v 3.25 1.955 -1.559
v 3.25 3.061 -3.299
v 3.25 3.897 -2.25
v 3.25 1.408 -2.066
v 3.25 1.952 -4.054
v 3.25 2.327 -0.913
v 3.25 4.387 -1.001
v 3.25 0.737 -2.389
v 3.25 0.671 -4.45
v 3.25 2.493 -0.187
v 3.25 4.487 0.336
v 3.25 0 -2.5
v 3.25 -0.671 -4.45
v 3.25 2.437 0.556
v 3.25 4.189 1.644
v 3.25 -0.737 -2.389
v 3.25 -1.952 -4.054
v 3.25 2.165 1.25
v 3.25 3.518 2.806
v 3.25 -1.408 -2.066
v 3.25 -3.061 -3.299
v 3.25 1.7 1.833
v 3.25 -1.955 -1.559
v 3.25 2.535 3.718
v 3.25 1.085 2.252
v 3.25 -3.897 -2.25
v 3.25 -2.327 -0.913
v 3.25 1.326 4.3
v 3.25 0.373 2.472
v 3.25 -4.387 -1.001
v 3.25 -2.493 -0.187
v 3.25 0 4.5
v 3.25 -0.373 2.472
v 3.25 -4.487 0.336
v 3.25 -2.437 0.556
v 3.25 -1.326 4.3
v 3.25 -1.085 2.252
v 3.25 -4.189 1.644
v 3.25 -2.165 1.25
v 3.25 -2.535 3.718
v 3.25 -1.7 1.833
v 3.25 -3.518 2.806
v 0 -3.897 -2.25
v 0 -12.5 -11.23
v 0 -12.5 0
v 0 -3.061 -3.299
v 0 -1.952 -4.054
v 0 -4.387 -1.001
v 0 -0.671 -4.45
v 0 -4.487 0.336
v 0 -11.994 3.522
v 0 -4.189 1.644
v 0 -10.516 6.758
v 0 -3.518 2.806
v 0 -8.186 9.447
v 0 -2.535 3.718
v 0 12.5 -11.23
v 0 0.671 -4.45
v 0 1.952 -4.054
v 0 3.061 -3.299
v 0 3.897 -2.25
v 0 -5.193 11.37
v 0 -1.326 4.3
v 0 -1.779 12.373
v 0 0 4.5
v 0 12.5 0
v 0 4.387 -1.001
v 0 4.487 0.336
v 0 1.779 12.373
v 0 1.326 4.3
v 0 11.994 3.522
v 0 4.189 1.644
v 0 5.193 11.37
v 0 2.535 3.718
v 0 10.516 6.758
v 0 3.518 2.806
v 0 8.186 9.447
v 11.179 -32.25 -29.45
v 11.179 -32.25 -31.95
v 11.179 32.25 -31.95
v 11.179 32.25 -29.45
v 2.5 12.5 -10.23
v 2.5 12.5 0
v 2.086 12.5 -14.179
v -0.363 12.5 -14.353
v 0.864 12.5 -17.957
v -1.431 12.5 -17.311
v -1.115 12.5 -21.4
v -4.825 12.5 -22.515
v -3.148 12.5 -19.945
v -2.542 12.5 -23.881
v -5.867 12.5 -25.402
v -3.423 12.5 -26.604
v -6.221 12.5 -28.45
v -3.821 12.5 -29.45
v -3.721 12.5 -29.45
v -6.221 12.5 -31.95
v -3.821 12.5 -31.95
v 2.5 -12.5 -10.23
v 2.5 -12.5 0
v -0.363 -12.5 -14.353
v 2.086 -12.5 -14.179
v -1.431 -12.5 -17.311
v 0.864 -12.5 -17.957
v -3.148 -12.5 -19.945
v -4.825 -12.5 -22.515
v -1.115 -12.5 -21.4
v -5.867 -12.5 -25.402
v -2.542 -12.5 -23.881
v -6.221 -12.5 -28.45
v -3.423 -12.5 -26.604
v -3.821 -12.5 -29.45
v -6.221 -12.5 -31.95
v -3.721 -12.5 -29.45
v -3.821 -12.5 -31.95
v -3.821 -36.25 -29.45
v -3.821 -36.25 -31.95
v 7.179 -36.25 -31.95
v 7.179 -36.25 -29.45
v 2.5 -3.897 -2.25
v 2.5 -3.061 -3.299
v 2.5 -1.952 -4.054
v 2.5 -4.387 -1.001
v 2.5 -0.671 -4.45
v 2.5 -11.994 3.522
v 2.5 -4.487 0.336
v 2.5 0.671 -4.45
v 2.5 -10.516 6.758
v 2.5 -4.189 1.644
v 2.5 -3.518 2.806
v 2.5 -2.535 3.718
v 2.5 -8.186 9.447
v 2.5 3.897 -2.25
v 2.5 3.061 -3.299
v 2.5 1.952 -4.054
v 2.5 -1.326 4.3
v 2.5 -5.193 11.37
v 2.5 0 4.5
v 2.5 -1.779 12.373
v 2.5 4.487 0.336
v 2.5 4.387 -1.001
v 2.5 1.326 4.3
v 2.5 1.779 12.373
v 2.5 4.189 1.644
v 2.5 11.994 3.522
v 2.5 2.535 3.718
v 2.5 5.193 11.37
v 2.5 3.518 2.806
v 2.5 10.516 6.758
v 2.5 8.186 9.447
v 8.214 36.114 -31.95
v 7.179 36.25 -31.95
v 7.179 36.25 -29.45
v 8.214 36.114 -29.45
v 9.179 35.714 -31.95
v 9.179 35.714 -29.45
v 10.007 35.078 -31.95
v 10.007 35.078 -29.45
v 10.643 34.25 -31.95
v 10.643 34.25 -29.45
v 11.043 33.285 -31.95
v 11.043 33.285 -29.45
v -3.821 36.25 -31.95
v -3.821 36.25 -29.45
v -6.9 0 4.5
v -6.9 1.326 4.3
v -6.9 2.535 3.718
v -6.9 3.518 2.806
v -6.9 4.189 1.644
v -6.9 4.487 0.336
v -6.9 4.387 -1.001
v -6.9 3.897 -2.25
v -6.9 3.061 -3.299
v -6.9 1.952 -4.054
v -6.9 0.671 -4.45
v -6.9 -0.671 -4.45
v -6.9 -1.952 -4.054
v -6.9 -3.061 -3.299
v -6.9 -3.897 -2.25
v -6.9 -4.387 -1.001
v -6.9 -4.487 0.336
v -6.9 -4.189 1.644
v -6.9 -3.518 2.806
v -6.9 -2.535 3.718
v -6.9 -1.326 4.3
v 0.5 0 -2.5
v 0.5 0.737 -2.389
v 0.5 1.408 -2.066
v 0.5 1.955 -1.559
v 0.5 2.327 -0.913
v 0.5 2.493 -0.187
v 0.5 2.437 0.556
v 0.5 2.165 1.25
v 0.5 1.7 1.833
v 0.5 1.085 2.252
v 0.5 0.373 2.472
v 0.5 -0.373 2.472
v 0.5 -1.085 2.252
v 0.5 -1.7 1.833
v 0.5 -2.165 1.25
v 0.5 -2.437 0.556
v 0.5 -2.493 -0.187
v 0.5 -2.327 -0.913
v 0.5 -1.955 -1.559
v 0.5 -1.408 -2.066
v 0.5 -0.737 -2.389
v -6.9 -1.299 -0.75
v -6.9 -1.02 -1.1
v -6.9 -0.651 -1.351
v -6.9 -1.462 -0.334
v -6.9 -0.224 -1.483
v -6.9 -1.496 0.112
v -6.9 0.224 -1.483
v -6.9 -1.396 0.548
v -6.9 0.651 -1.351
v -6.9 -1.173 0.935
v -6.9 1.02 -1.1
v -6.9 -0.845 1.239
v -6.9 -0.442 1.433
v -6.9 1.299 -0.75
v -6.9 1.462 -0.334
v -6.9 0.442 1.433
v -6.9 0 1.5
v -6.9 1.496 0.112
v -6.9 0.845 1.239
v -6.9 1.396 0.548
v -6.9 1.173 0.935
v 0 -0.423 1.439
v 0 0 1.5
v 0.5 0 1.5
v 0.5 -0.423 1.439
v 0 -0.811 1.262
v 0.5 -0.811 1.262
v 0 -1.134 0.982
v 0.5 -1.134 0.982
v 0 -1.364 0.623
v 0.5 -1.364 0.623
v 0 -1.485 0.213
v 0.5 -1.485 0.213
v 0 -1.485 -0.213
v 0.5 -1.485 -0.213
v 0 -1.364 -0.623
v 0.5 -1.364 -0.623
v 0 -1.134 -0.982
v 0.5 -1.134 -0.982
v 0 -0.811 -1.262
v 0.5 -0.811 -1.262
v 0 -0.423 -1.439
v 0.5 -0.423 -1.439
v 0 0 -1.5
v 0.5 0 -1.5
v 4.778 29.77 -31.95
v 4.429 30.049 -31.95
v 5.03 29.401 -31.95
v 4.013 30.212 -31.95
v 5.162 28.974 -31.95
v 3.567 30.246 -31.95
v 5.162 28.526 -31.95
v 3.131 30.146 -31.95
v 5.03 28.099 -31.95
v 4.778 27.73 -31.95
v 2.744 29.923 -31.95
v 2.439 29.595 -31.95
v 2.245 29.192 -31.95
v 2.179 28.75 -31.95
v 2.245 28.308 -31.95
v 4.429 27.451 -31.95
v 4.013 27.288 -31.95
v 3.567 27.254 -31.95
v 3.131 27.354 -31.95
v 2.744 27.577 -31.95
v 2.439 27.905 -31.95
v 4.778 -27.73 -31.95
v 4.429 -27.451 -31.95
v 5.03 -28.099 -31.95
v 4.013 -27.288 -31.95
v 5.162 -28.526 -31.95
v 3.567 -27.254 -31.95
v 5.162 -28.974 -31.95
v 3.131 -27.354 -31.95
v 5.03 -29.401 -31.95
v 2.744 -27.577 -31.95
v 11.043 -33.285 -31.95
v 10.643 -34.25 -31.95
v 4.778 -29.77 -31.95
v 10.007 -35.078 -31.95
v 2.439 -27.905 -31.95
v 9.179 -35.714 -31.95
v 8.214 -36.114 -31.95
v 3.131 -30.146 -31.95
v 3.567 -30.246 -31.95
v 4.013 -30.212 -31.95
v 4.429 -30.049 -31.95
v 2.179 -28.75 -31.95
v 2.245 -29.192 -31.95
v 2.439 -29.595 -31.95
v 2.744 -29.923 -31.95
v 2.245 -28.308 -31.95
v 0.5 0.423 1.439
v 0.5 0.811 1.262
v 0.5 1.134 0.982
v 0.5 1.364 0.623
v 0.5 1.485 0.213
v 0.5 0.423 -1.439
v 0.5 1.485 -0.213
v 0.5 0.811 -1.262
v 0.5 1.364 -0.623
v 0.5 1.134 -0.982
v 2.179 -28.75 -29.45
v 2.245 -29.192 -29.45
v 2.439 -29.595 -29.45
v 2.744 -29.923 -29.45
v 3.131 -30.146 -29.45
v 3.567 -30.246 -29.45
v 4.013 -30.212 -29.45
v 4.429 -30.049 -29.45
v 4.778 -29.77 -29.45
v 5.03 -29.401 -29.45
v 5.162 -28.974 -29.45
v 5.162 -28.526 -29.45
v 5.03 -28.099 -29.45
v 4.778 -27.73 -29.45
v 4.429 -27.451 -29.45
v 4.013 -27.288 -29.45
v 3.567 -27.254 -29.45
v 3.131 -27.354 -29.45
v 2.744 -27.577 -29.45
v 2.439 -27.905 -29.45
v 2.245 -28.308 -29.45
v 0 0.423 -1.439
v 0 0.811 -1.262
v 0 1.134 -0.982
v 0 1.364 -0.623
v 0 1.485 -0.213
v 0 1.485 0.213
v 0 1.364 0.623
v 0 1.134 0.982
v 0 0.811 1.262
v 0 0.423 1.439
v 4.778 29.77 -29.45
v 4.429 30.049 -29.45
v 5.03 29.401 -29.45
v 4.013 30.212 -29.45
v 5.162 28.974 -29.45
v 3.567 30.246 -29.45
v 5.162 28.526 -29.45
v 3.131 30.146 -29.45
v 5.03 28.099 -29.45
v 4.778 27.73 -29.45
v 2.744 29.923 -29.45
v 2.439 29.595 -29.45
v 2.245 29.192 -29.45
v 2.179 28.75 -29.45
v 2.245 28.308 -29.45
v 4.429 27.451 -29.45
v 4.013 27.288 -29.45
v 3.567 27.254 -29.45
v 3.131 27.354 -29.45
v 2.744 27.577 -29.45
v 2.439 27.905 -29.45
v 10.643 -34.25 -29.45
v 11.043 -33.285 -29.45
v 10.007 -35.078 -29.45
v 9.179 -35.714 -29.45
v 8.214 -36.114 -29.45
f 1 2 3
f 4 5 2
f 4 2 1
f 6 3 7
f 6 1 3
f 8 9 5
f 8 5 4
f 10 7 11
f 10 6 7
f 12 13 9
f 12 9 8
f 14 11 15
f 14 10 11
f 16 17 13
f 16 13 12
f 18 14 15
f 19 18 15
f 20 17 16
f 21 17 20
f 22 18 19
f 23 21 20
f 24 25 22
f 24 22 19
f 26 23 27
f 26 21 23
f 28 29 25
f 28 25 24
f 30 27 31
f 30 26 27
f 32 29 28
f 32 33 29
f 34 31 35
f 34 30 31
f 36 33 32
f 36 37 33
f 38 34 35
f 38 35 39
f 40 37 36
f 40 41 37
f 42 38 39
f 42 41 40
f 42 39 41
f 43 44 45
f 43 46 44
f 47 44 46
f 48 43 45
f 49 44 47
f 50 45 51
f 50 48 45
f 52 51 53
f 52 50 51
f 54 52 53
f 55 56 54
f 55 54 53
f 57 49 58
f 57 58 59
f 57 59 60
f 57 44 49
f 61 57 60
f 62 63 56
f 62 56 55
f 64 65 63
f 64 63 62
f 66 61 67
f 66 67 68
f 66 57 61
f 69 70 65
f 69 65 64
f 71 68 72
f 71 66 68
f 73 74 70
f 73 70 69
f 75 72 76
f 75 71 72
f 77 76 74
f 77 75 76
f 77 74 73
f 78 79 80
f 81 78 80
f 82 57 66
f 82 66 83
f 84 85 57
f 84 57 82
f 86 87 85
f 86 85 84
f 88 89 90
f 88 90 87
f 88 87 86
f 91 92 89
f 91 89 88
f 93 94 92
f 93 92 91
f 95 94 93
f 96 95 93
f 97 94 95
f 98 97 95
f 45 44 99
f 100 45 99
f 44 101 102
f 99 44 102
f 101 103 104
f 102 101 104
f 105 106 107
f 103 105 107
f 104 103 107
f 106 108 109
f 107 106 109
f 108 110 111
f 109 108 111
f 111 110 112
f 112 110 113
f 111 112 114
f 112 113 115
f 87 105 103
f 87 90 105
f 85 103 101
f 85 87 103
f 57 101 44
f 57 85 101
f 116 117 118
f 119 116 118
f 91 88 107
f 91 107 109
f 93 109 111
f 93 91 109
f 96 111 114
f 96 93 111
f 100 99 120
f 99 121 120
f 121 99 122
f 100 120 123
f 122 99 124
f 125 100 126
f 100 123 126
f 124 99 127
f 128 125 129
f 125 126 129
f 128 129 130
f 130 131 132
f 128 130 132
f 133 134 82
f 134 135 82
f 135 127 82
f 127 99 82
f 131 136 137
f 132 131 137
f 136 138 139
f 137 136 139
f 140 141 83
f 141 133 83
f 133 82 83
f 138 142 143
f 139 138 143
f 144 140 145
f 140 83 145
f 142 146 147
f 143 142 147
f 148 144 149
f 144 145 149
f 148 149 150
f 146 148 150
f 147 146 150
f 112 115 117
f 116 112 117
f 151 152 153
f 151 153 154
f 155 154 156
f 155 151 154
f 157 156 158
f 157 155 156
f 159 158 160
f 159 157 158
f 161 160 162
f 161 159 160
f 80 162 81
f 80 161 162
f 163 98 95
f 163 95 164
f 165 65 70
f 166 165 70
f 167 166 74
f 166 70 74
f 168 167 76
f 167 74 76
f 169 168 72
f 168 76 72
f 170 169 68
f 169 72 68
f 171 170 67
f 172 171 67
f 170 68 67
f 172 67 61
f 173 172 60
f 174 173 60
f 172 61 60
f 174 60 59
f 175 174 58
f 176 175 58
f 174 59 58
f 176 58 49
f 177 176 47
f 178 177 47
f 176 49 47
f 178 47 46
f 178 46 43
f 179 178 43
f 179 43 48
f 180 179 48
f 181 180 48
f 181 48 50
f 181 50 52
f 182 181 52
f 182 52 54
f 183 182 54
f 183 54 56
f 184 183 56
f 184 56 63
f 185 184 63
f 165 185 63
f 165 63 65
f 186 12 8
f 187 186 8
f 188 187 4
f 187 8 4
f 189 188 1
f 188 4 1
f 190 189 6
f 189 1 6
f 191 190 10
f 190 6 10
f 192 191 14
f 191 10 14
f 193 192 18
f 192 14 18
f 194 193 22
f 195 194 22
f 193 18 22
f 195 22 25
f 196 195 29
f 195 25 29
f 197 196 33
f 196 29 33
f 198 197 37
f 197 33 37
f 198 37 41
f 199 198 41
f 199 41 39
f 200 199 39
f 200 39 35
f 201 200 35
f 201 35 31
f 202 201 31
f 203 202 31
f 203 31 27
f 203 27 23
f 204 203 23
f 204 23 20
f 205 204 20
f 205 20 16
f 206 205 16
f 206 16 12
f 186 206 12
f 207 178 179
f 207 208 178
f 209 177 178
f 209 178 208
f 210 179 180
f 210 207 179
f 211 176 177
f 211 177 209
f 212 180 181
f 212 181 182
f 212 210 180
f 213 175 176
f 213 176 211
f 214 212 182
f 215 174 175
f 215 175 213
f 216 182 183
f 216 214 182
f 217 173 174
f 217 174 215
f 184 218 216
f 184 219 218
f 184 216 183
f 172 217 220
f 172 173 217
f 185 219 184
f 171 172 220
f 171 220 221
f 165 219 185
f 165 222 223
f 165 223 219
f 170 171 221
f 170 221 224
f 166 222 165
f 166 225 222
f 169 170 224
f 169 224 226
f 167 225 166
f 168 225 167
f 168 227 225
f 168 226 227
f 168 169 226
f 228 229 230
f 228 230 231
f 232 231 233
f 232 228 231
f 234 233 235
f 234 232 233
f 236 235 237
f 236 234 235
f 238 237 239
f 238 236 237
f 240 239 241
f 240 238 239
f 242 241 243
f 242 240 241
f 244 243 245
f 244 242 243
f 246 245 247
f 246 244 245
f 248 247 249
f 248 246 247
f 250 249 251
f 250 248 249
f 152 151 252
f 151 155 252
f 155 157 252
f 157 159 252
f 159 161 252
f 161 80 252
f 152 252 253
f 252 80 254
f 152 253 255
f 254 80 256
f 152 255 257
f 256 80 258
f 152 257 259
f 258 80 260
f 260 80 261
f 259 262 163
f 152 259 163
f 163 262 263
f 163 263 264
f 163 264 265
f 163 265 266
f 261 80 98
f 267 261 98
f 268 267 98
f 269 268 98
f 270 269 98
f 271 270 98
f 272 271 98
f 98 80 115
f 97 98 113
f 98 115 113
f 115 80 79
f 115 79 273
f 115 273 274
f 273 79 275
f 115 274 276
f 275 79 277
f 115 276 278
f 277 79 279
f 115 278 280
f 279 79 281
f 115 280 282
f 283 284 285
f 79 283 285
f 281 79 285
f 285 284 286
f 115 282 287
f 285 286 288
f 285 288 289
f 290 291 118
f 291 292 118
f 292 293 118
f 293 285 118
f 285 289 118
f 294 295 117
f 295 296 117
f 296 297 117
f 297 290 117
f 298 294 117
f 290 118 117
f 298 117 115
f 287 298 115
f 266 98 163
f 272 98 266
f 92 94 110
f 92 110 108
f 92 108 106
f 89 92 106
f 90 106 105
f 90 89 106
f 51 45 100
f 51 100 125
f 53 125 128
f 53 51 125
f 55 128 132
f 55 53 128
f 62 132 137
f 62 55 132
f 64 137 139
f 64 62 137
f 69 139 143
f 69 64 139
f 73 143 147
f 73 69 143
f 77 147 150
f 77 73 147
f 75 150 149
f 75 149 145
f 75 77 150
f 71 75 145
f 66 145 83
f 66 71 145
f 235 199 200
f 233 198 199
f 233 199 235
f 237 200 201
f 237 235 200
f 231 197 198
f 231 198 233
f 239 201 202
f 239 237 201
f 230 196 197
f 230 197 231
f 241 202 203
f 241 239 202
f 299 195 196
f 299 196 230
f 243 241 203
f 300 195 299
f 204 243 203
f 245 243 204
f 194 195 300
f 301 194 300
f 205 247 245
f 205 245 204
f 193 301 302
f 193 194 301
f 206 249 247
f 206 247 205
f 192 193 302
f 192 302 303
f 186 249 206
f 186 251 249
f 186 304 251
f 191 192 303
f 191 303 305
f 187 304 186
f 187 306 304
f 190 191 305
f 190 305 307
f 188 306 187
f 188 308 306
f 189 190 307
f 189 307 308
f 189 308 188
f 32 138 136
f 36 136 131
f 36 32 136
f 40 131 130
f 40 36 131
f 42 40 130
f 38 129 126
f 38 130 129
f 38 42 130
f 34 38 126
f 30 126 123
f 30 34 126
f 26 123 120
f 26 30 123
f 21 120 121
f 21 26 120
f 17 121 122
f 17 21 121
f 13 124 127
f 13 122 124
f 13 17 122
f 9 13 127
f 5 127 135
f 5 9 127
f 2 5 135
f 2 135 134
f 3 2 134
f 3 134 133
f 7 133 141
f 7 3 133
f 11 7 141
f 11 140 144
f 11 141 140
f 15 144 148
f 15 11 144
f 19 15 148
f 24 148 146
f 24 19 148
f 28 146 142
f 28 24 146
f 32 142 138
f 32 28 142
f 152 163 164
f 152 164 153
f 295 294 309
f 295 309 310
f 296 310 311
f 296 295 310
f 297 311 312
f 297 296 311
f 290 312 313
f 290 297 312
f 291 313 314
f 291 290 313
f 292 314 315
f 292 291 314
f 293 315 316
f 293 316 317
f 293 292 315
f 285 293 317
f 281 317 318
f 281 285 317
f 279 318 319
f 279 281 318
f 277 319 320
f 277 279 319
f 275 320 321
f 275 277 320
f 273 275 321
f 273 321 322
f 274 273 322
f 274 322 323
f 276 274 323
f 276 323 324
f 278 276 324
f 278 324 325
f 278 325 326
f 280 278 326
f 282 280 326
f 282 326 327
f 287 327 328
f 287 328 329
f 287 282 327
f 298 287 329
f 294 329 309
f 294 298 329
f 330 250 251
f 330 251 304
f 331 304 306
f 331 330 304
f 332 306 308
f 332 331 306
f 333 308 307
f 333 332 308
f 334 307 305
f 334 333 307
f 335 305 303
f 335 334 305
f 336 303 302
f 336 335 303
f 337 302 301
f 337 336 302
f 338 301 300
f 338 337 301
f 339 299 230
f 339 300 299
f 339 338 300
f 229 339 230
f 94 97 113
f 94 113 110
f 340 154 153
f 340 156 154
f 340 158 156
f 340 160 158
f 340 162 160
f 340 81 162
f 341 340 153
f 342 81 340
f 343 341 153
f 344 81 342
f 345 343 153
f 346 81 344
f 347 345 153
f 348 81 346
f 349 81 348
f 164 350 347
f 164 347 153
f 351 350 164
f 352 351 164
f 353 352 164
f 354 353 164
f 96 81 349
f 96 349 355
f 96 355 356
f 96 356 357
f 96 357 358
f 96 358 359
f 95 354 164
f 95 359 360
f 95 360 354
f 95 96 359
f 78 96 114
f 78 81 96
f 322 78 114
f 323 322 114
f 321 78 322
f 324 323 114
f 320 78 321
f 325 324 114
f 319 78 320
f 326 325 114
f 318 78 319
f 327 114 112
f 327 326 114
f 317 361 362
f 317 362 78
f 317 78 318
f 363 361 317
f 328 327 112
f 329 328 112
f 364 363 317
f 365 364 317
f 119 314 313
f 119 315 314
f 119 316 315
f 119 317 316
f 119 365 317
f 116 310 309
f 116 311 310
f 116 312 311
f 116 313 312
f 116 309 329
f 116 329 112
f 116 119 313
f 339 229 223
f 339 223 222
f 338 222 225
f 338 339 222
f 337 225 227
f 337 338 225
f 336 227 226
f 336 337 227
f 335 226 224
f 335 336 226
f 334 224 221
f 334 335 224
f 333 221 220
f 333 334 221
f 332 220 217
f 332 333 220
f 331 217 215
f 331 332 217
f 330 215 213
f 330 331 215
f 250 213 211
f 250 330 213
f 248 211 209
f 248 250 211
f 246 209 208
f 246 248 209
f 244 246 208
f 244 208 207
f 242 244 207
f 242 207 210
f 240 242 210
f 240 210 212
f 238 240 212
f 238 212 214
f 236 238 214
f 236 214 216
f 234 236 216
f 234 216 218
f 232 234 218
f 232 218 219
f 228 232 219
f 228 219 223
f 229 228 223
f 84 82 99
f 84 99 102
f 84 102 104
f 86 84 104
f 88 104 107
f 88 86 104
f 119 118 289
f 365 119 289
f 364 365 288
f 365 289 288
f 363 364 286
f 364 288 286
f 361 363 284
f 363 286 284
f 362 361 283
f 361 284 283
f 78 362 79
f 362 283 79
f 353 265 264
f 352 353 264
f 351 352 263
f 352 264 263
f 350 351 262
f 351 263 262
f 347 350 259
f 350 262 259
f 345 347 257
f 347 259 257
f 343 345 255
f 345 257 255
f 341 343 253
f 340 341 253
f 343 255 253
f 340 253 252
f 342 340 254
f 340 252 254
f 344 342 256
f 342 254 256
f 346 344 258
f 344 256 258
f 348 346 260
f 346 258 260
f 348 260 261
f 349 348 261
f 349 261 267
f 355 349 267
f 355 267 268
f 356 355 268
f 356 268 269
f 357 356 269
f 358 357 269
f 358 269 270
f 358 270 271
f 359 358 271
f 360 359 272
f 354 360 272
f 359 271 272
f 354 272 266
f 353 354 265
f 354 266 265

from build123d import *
from build123d.topology import SkipClean

# Parameters (mm, degrees)
SKETCH1_R                = 1.5
BOSS_EXTRUDE1_DEPTH      = 2.5
BOSS_EXTRUDE2_DEPTH      = 6.9
BOSS_EXTRUDE2_DEPTH_BACK = 2.5
SKETCH2_R                = 4.5
SKETCH2_R_2              = 1.5
SKETCH4_R                = 2.5
CUT_EXTRUDE1_DEPTH       = 2
BOSS_EXTRUDE3_START      = 0.75
SKETCH5_R                = 4.5
SKETCH5_R_2              = 2.5
BOSS_EXTRUDE3_DEPTH      = 0.75
BOSS_EXTRUDE4_DEPTH      = 2.5
CUT_EXTRUDE2_REACH       = 80.314
SKETCH7_W                = 7
SKETCH7_H                = 16.5
SKETCH7_W_2              = 16
SKETCH7_H_2              = 8
CUT_EXTRUDE3_REACH       = 82.041
SKETCH9_W                = 2.5
SKETCH9_H                = 22.388822383
BOSS_EXTRUDE5_DEPTH      = 12.5
FILLET2_R                = 1
FILLET3_R                = 4
CUT_EXTRUDE4_DEPTH       = 74.103052287
CUT_EXTRUDE4_DEPTH_BACK  = 74.103052287
SKETCH10_W               = 78.235731334
SKETCH10_H               = 6.290045588
SKETCH11_W               = 14.9
SKETCH11_H               = 2.5
BOSS_EXTRUDE6_DEPTH      = 12.5
BOSS_EXTRUDE7_DEPTH      = 2.5
SKETCH14_R               = 1.5
CUT_EXTRUDE5_DEPTH       = 2.5


with BuildPart() as part:
    # Sketch1 → Boss-Extrude1 (new body)
    with BuildSketch(Plane(origin=(0, 0, 0), x_dir=(0, 0, -1), z_dir=(1, 0, 0))):
        with BuildLine():
            Line((0, 12.5), (34.45, 12.5))
            Line((34.45, 12.5), (34.45, -12.5))
            Line((34.45, -12.5), (0, -12.5))
            ThreePointArc((0, -12.5), (-12.5, 0), (0, 12.5))
        make_face()
        Circle(SKETCH1_R, mode=Mode.SUBTRACT)
    extrude(amount=BOSS_EXTRUDE1_DEPTH)

    # Sketch2 → Boss-Extrude2 (add, two sides: drawn at the far end of the back side and taken through both)
    with BuildSketch(Plane.ZY.offset(-BOSS_EXTRUDE2_DEPTH_BACK)):
        Circle(SKETCH2_R)
        Circle(SKETCH2_R_2, mode=Mode.SUBTRACT)
    extrude(amount=BOSS_EXTRUDE2_DEPTH + BOSS_EXTRUDE2_DEPTH_BACK)

    # Sketch4 → Cut-Extrude1 (cut)
    with BuildSketch(Plane(origin=(2.5, 0, 0), x_dir=(0, 0, -1), z_dir=(1, 0, 0))):
        Circle(SKETCH4_R)
    extrude(amount=-CUT_EXTRUDE1_DEPTH, mode=Mode.SUBTRACT)

    # Sketch5 → Boss-Extrude3 (add)
    with SkipClean():  # the faces are left unmerged after this step: merging them gives an invalid solid
        with BuildSketch(Plane(origin=(2.5, 0, 0), x_dir=(0, 0, -1), z_dir=(1, 0, 0)).offset(BOSS_EXTRUDE3_START)):
            with Locations(Location((0, 0, 0), (0, 0, 180))):
                Circle(SKETCH5_R)
            Circle(SKETCH5_R_2, mode=Mode.SUBTRACT)
        extrude(amount=-BOSS_EXTRUDE3_DEPTH)

    # Sketch6 → Boss-Extrude4 (add)
    with SkipClean():  # the faces are left unmerged after this step: merging them gives an invalid solid
        with BuildSketch(Plane(origin=(0, 0, -34.45), x_dir=(-1, 0, 0), z_dir=(0, 0, -1))):
            Polygon((-8.812505246, 36.25), (53.321583376, 36.25), (53.321583376, -36.25), (6.25, -36.25), (-19.178416624, -36.25), (-19.178416624, 36.25), align=None)
        extrude(amount=-BOSS_EXTRUDE4_DEPTH)
    add(part.part.scale(1), mode=Mode.REPLACE)  # the faces are merged on a copy

    # Sketch7 → Cut-Extrude2 (cut, up to next)
    with BuildSketch(Plane.XY.offset(-31.95), mode=Mode.PRIVATE) as cut_extrude2_sk1:
        with Locations((-1.711858899, -11.632438111)):
            Rectangle(SKETCH7_W, SKETCH7_H)
    cut_extrude2_tool1 = extrude(cut_extrude2_sk1.sketch, amount=-CUT_EXTRUDE2_REACH, mode=Mode.PRIVATE) & part.part
    # Sketch7 → Cut-Extrude2 (cut, up to next)
    with BuildSketch(Plane.XY.offset(-31.95), mode=Mode.PRIVATE) as cut_extrude2_sk2:
        with Locations((-16.5, 0)):
            Rectangle(SKETCH7_W_2, SKETCH7_H_2)
    cut_extrude2_tool2 = extrude(cut_extrude2_sk2.sketch, amount=-CUT_EXTRUDE2_REACH, mode=Mode.PRIVATE) & part.part
    add(cut_extrude2_tool1.solids().sort_by_distance((-1.711859, -11.632438, -31.95))[0], mode=Mode.SUBTRACT)
    add(cut_extrude2_tool2.solids().sort_by_distance((-16.5, 0, -31.95))[0], mode=Mode.SUBTRACT)

    # Sketch9 → Cut-Extrude3 (cut, up to next)
    with BuildSketch(Plane.XZ.offset(12.5), mode=Mode.PRIVATE) as cut_extrude3_sk1:
        with Locations((1.25, -20.755588809)):
            Rectangle(SKETCH9_W, SKETCH9_H)
    cut_extrude3_tool1 = extrude(cut_extrude3_sk1.sketch, amount=-CUT_EXTRUDE3_REACH, mode=Mode.PRIVATE) & part.part
    add(cut_extrude3_tool1.solids().sort_by_distance((1.25, -12.5, -20.755589))[0], mode=Mode.SUBTRACT)


with BuildPart() as cut_extrude3_piece_1:
    # of the separate pieces the step leaves, piece 1, a body of its own (cut_extrude3_pieces)
    add(part.part.solids().sort_by_distance((-53.321583376, 36.25, -31.95))[0])



with BuildPart() as cut_extrude3_piece_2:
    # of the separate pieces the step leaves, piece 2, a body of its own (cut_extrude3_pieces)
    add(part.part.solids().sort_by_distance((0, 12.5, 0))[0])


with BuildPart() as cut_extrude3_piece_1_1:
    add(cut_extrude3_piece_1.part)

    add(cut_extrude3_piece_2.part)  # Boss-Extrude5 merges Cut-Extrude3 piece 2
    # Sketch8 → Boss-Extrude5 (add, symmetric)
    with BuildSketch(Plane(origin=(0, 0, 0), x_dir=(1, 0, 0), z_dir=(0, 1, 0))):
        with BuildLine():
            Line((0, 7.729605828), (2.5, 7.729605828))
            Line((2.5, 7.729605828), (2.5, 10.229605828))
            ThreePointArc((2.5, 10.229605828), (1.573627862, 16.099871922), (-1.115452176, 21.399592472))
            ThreePointArc((-1.115452176, 21.399592472), (-3.053519862, 25.219195088), (-3.721172696, 29.45))
            Line((-3.721172696, 29.45), (-3.721172696, 31.95))
            Line((-3.721172696, 31.95), (-6.221172696, 31.95))
            Line((-6.221172696, 31.95), (-6.221172696, 28.45))
            ThreePointArc((-6.221172696, 28.45), (-5.429444077, 23.92831405), (-3.148463103, 19.944646916))
            ThreePointArc((-3.148463103, 19.944646916), (-0.81124762, 15.862767844), (0, 11.229605828))
            Line((0, 11.229605828), (0, 7.729605828))
        make_face()
    extrude(amount=BOSS_EXTRUDE5_DEPTH, both=True)

    # Fillet2
    fillet2_edges = [cut_extrude3_piece_1_1.edges().sort_by_distance(p)[0] for p in [
        (-8.5, 4, -33.2),
        (-8.5, -4, -33.2),
        (-24.5, -4, -33.2),
        (-24.5, 4, -33.2),
        (-5.211858899, -19.882438111, -33.2),
        (-5.211858899, -3.382438111, -33.2),
        (1.788141101, -3.382438111, -33.2),
        (1.788141101, -19.882438111, -33.2),
    ]]
    fillet(fillet2_edges, radius=FILLET2_R)

    # Fillet3
    fillet3_edges = [cut_extrude3_piece_1_1.edges().sort_by_distance(p)[0] for p in [
        (19.178416624, 36.25, -33.2),
        (-53.321583376, 36.25, -33.2),
        (-53.321583376, -36.25, -33.2),
        (19.178416624, -36.25, -33.2),
    ]]
    fillet(fillet3_edges, radius=FILLET3_R)

    # Sketch10 → Cut-Extrude4 (cut, two sides: drawn at the far end of the back side and taken through both)
    with SkipClean():  # the faces are left unmerged after this step: merging them gives an invalid solid
        with BuildSketch(Plane(origin=(0, 0, 0), x_dir=(1, 0, 0), z_dir=(0, 1, 0)).offset(-CUT_EXTRUDE4_DEPTH_BACK)):
            with Locations((-17.391929865, 35.095022794)):
                Rectangle(SKETCH10_W, SKETCH10_H)
        extrude(amount=CUT_EXTRUDE4_DEPTH + CUT_EXTRUDE4_DEPTH_BACK, mode=Mode.SUBTRACT)

    # Sketch11 → Boss-Extrude6 (add, symmetric)
    with BuildSketch(Plane(origin=(0, 0, 0), x_dir=(1, 0, 0), z_dir=(0, 1, 0))):
        with Locations((3.728827304, 30.7)):
            Rectangle(SKETCH11_W, SKETCH11_H)
    boss_extrude6 = extrude(amount=BOSS_EXTRUDE6_DEPTH, both=True)

    # Sketch13 → Boss-Extrude7 (add)
    with BuildSketch(Plane(origin=(0, 0, -31.95), x_dir=(-1, 0, 0), z_dir=(0, 0, -1))):
        with BuildLine():
            Line((-11.178827304, 12.5), (3.821172696, 12.5))
            Line((3.821172696, 12.5), (3.821172696, 28.75))
            Line((3.821172696, 28.75), (3.821172696, 36.25))
            Line((3.821172696, 36.25), (-3.678827304, 36.25))
            Line((-3.678827304, 36.25), (-7.178827304, 36.25))
            ThreePointArc((-7.178827304, 36.25), (-10.007254429, 35.078427125), (-11.178827304, 32.25))
            Line((-11.178827304, 32.25), (-11.178827304, 28.75))
            Line((-11.178827304, 28.75), (-11.178827304, 12.5))
        make_face()
    boss_extrude7 = extrude(amount=-BOSS_EXTRUDE7_DEPTH)

    # Mirror1: Boss-Extrude6, Boss-Extrude7 across plane
    add(boss_extrude6.mirror(Plane.ZX))
    add(boss_extrude7.mirror(Plane.ZX))

    # Sketch14 → Cut-Extrude5 (cut)
    with BuildSketch(Plane(origin=(0, 0, -31.95), x_dir=(-1, 0, 0), z_dir=(0, 0, -1))):
        with Locations((-3.678827304, 28.75)):
            Circle(SKETCH14_R)
    cut_extrude5 = extrude(amount=-CUT_EXTRUDE5_DEPTH, mode=Mode.SUBTRACT)

    # Mirror2: Cut-Extrude5 across plane
    add(cut_extrude5.mirror(Plane.ZX), mode=Mode.SUBTRACT)


solid = cut_extrude3_piece_1_1.part
